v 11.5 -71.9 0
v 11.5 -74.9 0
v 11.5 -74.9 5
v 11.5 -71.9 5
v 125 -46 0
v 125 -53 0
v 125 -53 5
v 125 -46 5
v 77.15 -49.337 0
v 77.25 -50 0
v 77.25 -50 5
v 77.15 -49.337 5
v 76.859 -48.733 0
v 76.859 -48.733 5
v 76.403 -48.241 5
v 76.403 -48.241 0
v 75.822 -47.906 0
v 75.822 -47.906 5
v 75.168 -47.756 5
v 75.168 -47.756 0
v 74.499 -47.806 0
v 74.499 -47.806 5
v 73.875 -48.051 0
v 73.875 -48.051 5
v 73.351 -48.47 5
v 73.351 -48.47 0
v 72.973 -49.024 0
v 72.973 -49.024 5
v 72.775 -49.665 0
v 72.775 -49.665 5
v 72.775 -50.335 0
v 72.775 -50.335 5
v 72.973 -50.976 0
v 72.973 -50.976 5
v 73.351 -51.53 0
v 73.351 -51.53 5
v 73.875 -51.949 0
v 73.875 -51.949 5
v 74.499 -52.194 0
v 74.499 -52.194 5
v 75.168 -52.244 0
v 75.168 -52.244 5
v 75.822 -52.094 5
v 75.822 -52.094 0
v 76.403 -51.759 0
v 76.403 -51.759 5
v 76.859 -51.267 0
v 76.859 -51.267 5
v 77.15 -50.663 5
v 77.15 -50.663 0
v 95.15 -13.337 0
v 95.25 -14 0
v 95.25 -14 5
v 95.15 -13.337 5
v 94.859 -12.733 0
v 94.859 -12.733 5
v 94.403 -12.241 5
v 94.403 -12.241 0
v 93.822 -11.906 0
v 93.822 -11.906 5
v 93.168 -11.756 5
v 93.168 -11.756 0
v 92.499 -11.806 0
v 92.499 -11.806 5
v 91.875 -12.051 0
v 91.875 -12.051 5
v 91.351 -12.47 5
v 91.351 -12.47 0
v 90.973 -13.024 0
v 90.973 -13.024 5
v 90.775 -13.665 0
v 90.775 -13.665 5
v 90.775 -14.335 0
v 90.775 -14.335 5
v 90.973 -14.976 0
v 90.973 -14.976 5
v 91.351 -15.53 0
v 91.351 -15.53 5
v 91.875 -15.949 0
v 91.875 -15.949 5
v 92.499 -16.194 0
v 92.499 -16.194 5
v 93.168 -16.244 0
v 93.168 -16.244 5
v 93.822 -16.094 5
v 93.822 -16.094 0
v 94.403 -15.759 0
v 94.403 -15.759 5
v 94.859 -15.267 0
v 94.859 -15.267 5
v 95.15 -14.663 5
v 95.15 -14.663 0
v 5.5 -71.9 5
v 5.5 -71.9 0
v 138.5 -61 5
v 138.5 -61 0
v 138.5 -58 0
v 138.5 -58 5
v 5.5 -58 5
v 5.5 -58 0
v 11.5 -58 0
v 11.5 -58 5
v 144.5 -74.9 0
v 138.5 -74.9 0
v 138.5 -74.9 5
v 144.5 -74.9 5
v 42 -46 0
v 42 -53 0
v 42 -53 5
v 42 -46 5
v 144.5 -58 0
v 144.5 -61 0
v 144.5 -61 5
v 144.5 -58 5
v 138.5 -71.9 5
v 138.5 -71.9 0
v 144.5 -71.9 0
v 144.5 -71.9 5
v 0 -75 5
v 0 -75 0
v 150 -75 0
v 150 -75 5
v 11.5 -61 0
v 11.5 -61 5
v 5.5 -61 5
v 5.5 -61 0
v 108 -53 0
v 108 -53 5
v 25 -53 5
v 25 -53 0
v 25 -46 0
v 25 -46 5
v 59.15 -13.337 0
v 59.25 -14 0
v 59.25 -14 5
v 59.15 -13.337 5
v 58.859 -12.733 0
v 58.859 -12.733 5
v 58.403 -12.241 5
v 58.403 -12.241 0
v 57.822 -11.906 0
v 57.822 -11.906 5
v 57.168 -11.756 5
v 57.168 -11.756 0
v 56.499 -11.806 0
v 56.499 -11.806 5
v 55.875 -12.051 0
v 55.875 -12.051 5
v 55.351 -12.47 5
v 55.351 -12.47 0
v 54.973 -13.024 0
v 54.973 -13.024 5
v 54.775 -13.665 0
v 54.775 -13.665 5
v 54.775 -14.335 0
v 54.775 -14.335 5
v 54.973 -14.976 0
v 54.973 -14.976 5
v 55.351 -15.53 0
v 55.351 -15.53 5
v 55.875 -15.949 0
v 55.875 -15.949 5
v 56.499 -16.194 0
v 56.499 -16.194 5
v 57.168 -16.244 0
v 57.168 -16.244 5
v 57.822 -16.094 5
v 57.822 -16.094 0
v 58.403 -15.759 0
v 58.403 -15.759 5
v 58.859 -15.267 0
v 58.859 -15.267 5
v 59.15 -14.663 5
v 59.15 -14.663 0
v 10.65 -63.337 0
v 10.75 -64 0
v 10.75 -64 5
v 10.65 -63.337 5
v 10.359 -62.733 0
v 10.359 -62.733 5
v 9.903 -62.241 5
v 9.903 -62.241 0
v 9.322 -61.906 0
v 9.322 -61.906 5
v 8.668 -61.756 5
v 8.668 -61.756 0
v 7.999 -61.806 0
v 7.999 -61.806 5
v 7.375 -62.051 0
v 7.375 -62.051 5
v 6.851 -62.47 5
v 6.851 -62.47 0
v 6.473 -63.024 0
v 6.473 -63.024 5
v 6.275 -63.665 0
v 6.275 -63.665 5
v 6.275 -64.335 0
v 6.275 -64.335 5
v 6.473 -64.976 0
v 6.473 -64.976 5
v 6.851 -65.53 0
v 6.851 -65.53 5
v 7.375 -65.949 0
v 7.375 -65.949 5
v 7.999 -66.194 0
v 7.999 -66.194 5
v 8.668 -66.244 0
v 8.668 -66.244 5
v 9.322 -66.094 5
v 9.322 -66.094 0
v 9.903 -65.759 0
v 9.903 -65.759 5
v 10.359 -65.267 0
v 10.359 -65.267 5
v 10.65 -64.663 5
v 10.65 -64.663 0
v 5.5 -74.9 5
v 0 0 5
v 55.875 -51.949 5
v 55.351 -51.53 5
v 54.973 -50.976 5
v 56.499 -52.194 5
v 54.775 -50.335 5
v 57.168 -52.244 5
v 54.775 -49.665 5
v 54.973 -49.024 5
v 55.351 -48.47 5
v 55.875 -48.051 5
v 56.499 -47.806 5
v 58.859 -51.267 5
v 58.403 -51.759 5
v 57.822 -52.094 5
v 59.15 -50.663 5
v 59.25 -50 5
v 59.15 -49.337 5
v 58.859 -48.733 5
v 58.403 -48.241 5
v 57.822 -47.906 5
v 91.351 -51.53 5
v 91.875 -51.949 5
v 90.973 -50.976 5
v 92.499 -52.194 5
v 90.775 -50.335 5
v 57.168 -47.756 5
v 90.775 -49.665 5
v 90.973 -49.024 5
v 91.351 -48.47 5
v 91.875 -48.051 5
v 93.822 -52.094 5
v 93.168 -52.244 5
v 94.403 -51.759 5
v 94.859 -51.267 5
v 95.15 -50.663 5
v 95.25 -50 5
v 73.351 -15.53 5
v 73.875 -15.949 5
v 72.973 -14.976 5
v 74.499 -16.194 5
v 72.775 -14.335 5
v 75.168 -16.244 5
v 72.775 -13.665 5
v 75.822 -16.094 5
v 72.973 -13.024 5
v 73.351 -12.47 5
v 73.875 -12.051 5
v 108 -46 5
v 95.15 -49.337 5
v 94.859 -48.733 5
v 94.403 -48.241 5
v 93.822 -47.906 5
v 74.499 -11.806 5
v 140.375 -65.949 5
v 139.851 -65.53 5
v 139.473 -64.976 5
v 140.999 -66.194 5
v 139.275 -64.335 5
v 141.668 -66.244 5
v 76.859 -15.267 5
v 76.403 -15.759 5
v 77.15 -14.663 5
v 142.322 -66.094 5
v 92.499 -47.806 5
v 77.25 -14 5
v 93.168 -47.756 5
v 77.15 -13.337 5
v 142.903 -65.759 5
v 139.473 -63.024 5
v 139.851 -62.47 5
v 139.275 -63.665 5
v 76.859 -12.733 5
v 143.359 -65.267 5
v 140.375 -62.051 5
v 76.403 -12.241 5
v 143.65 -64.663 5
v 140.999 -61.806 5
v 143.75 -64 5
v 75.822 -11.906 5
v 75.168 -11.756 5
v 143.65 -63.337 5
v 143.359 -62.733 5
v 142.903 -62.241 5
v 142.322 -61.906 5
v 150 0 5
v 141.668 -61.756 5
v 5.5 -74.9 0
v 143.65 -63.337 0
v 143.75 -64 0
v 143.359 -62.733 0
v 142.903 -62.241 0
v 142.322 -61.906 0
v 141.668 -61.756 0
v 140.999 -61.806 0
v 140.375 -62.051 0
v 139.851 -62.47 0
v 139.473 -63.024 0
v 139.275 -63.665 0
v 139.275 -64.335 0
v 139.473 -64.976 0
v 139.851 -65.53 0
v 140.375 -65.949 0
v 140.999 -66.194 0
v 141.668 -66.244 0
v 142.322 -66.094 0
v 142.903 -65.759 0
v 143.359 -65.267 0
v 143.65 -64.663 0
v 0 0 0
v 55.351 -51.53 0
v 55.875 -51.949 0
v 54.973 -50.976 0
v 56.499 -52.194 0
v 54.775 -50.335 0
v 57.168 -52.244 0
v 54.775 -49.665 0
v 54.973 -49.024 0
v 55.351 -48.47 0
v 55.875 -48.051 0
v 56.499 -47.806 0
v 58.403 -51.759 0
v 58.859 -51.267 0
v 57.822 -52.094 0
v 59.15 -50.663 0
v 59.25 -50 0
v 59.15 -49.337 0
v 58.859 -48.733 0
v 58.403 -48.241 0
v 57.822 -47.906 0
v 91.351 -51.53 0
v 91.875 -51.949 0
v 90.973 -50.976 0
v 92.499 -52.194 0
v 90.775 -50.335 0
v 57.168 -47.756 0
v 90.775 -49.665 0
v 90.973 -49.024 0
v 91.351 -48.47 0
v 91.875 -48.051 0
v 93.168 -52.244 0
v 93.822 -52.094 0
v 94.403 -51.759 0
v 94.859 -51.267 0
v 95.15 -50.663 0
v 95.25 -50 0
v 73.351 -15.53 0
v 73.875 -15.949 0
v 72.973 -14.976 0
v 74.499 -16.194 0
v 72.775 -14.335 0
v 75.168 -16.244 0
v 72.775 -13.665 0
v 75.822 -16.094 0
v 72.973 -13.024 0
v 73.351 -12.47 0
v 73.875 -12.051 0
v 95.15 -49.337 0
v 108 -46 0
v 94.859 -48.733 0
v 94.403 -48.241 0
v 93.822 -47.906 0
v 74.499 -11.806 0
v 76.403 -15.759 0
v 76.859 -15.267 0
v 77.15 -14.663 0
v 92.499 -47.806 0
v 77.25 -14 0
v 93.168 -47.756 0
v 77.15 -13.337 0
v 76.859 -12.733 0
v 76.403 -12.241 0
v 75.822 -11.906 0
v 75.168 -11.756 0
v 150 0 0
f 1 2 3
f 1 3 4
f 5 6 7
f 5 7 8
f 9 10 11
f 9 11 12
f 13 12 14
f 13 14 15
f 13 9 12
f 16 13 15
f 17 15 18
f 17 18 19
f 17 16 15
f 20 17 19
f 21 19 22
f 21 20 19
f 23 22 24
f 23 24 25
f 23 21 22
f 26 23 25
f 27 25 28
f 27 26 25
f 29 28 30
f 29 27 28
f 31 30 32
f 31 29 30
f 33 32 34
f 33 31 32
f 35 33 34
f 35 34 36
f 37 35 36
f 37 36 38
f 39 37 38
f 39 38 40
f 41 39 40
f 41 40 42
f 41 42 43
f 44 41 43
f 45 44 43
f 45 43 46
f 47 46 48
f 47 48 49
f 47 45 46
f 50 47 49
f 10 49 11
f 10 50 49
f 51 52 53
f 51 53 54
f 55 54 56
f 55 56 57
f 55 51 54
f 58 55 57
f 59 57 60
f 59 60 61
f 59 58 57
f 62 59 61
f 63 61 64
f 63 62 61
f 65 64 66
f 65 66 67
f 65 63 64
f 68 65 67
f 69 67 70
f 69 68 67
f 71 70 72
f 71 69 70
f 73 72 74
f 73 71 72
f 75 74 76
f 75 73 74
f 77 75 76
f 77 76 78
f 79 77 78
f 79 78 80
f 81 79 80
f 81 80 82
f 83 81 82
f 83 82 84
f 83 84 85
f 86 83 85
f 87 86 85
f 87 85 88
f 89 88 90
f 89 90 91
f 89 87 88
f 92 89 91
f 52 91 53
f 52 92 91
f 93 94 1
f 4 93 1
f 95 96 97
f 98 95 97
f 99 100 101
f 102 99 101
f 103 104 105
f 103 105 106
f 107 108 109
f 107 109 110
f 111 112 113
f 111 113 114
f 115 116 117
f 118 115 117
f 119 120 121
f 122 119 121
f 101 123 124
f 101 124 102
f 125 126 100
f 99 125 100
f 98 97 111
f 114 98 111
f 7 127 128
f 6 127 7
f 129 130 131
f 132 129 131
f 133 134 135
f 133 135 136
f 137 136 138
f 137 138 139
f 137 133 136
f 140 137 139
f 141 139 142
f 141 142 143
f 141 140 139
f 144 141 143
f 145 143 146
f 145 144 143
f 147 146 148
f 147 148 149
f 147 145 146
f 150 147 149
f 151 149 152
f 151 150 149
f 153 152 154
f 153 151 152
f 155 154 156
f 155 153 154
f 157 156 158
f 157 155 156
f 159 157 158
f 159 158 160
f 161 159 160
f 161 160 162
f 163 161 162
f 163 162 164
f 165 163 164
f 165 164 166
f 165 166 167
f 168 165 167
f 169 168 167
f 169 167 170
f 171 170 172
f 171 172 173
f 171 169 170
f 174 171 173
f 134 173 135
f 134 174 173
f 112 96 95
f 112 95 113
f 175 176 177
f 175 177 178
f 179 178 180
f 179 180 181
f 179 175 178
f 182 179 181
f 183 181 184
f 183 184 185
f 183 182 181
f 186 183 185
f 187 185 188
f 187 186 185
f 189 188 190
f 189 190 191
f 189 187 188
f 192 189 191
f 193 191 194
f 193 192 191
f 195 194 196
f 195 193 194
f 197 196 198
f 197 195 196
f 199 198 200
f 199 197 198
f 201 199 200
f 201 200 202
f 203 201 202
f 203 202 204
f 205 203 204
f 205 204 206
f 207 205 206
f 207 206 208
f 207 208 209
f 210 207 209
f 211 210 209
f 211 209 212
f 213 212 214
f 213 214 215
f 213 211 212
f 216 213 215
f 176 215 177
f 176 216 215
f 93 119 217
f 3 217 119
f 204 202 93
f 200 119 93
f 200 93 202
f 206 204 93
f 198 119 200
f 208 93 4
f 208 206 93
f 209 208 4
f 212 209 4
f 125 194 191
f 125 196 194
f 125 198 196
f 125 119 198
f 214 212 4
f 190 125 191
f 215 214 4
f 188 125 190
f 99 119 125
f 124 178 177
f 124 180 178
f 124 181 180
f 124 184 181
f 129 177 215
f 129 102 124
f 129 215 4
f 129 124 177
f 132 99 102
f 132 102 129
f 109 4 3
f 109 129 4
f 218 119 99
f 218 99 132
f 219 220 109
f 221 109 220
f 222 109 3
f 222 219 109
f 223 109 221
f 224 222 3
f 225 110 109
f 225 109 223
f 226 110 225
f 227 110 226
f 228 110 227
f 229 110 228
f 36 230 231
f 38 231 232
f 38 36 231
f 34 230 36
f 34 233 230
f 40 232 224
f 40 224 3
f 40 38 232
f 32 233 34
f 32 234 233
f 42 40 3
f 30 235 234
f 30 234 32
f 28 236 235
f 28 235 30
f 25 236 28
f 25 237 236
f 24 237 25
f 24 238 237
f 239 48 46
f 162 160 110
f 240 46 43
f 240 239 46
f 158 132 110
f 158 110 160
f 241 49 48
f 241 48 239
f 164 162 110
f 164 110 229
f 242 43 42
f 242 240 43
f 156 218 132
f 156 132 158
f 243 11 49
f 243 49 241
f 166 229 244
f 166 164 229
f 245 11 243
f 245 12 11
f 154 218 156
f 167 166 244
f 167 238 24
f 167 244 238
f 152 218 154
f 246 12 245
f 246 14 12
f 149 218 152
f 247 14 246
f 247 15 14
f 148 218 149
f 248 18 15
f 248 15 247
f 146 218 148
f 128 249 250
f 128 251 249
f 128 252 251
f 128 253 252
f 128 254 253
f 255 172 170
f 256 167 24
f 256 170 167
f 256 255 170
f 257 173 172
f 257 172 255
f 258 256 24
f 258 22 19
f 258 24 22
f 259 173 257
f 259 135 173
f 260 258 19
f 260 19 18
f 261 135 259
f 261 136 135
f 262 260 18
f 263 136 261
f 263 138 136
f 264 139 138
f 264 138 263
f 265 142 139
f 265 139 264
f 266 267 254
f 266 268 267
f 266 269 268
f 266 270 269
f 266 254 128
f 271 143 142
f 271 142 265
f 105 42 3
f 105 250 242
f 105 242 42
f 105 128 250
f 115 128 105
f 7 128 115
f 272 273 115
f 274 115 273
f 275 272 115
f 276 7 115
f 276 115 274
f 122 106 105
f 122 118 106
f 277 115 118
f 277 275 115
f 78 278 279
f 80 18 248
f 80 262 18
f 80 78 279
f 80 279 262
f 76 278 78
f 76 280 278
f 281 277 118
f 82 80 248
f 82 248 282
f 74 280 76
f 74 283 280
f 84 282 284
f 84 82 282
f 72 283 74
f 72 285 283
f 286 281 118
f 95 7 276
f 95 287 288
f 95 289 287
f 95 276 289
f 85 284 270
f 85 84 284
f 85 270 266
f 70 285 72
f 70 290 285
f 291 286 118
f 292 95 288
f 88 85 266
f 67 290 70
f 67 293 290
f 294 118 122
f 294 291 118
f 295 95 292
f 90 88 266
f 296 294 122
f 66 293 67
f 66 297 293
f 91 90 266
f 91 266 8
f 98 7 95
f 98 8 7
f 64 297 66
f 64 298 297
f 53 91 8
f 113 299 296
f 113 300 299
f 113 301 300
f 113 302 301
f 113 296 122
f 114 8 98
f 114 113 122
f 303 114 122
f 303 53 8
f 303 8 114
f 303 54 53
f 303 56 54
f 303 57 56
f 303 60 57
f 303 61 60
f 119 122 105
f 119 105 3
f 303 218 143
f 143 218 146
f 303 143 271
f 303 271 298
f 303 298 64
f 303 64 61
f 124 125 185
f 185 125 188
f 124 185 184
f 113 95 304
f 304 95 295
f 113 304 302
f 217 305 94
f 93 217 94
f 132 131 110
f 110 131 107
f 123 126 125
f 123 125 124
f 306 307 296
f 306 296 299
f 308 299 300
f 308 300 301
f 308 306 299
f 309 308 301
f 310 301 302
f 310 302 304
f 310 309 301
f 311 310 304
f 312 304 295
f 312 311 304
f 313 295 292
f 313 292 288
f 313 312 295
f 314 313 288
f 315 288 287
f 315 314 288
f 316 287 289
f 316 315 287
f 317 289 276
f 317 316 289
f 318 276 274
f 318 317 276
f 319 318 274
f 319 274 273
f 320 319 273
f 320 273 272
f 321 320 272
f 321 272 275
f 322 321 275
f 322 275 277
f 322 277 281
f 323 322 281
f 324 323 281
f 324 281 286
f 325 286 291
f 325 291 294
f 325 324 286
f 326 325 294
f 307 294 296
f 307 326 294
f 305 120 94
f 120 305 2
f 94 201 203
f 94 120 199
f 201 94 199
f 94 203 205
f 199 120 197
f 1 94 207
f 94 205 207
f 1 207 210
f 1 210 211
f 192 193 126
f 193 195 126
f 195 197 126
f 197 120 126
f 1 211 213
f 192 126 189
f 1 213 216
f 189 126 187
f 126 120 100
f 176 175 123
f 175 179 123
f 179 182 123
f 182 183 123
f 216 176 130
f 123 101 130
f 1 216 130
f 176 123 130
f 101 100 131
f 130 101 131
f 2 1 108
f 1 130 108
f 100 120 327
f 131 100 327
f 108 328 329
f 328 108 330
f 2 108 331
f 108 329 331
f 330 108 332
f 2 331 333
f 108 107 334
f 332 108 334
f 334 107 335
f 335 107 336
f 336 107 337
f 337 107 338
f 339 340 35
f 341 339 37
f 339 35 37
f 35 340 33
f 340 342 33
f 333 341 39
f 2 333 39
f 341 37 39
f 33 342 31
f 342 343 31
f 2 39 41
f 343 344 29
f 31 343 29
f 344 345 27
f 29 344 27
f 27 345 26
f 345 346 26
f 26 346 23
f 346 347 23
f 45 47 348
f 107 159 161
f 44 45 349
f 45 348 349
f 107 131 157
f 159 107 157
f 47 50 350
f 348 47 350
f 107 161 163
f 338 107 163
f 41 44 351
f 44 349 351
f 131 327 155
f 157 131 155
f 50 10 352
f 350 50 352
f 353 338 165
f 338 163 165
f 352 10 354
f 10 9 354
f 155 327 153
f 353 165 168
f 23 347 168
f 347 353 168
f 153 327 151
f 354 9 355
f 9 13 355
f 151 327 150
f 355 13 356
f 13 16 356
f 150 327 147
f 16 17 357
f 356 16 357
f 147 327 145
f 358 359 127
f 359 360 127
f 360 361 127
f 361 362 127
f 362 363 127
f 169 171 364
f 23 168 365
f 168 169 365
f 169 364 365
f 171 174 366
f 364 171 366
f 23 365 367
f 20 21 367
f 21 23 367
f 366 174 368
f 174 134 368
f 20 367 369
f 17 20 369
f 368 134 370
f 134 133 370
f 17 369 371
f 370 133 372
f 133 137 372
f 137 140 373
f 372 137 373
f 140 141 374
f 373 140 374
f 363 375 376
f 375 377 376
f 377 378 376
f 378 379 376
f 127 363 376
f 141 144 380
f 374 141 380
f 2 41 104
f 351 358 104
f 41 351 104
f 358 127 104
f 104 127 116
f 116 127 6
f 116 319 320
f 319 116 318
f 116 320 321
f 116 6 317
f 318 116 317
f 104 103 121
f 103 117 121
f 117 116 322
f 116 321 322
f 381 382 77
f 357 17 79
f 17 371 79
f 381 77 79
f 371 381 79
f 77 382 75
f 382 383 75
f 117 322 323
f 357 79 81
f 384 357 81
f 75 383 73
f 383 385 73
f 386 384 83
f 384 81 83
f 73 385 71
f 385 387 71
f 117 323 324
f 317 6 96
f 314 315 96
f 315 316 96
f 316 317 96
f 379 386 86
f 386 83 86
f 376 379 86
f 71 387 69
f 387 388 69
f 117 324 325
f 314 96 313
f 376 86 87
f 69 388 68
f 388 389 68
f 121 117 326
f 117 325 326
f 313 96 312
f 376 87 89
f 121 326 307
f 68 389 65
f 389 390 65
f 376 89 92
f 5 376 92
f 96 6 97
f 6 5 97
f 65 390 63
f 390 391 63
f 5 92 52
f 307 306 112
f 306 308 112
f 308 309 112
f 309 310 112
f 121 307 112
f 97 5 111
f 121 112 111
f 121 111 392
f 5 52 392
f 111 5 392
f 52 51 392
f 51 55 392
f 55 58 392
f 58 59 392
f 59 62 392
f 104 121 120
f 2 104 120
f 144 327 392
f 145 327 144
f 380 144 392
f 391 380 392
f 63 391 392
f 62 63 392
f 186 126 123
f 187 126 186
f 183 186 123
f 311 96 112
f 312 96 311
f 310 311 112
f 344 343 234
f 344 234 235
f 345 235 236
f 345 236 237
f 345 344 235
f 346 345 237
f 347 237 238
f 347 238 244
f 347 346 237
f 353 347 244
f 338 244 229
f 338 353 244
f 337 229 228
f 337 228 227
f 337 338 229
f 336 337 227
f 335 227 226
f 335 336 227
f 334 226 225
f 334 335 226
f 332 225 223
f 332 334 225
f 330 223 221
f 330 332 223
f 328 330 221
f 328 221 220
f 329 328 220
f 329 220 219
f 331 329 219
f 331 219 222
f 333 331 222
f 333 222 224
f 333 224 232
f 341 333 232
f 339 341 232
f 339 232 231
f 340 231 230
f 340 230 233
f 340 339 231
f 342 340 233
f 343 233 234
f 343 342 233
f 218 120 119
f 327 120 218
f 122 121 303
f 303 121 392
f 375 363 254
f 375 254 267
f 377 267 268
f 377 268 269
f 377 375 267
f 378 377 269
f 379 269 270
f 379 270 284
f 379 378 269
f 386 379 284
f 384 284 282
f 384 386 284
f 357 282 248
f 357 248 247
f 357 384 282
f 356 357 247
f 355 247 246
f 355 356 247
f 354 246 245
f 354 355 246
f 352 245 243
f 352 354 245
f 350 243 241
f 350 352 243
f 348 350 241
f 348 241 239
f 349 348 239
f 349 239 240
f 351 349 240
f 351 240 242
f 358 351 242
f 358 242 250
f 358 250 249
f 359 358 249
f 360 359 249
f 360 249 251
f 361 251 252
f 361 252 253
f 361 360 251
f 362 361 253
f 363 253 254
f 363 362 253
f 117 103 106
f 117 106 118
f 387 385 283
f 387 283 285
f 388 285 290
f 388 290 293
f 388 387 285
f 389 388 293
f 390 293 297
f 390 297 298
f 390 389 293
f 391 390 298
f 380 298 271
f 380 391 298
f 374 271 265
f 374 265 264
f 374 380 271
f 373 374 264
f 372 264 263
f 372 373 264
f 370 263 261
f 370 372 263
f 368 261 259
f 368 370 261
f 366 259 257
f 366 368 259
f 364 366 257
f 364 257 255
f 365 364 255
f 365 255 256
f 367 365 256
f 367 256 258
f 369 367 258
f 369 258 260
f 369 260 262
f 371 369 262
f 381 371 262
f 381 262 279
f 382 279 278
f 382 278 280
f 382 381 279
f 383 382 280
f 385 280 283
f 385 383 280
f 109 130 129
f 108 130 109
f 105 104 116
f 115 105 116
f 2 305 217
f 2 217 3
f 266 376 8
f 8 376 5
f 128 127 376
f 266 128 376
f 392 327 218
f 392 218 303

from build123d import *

# Parameters (mm, degrees)
ESQUISSE1_W        = 150
ESQUISSE1_H        = 75
ESQUISSE1_R        = 2.25
ESQUISSE1_W_2      = 6
ESQUISSE1_H_2      = 3
ESQUISSE1_W_3      = 17
ESQUISSE1_H_3      = 7
BOSS_EXTRU_1_DEPTH = 5


with BuildPart() as part:
    # Esquisse1 → Boss.-Extru.1 (new body)
    with BuildSketch(Plane.XY):
        with Locations((75, -37.5)):
            Rectangle(ESQUISSE1_W, ESQUISSE1_H)
        with Locations((8.5, -64)):
            Circle(ESQUISSE1_R, mode=Mode.SUBTRACT)
        with Locations((141.5, -64)):
            Circle(ESQUISSE1_R, mode=Mode.SUBTRACT)
        with Locations((57, -14)):
            Circle(ESQUISSE1_R, mode=Mode.SUBTRACT)
        with Locations((93, -14)):
            Circle(ESQUISSE1_R, mode=Mode.SUBTRACT)
        with Locations((93, -50)):
            Circle(ESQUISSE1_R, mode=Mode.SUBTRACT)
        with Locations((57, -50)):
            Circle(ESQUISSE1_R, mode=Mode.SUBTRACT)
        with Locations((75, -14)):
            Circle(ESQUISSE1_R, mode=Mode.SUBTRACT)
        with Locations((75, -50)):
            Circle(ESQUISSE1_R, mode=Mode.SUBTRACT)
        with Locations((8.5, -59.5)):
            Rectangle(ESQUISSE1_W_2, ESQUISSE1_H_2, mode=Mode.SUBTRACT)
        with Locations((8.5, -73.4)):
            Rectangle(ESQUISSE1_W_2, ESQUISSE1_H_2, mode=Mode.SUBTRACT)
        with Locations((141.5, -59.5)):
            Rectangle(ESQUISSE1_W_2, ESQUISSE1_H_2, mode=Mode.SUBTRACT)
        with Locations((141.5, -73.4)):
            Rectangle(ESQUISSE1_W_2, ESQUISSE1_H_2, mode=Mode.SUBTRACT)
        with Locations((33.5, -49.5)):
            Rectangle(ESQUISSE1_W_3, ESQUISSE1_H_3, mode=Mode.SUBTRACT)
        with Locations((116.5, -49.5)):
            Rectangle(ESQUISSE1_W_3, ESQUISSE1_H_3, mode=Mode.SUBTRACT)
    extrude(amount=BOSS_EXTRU_1_DEPTH)


solid = part.part
